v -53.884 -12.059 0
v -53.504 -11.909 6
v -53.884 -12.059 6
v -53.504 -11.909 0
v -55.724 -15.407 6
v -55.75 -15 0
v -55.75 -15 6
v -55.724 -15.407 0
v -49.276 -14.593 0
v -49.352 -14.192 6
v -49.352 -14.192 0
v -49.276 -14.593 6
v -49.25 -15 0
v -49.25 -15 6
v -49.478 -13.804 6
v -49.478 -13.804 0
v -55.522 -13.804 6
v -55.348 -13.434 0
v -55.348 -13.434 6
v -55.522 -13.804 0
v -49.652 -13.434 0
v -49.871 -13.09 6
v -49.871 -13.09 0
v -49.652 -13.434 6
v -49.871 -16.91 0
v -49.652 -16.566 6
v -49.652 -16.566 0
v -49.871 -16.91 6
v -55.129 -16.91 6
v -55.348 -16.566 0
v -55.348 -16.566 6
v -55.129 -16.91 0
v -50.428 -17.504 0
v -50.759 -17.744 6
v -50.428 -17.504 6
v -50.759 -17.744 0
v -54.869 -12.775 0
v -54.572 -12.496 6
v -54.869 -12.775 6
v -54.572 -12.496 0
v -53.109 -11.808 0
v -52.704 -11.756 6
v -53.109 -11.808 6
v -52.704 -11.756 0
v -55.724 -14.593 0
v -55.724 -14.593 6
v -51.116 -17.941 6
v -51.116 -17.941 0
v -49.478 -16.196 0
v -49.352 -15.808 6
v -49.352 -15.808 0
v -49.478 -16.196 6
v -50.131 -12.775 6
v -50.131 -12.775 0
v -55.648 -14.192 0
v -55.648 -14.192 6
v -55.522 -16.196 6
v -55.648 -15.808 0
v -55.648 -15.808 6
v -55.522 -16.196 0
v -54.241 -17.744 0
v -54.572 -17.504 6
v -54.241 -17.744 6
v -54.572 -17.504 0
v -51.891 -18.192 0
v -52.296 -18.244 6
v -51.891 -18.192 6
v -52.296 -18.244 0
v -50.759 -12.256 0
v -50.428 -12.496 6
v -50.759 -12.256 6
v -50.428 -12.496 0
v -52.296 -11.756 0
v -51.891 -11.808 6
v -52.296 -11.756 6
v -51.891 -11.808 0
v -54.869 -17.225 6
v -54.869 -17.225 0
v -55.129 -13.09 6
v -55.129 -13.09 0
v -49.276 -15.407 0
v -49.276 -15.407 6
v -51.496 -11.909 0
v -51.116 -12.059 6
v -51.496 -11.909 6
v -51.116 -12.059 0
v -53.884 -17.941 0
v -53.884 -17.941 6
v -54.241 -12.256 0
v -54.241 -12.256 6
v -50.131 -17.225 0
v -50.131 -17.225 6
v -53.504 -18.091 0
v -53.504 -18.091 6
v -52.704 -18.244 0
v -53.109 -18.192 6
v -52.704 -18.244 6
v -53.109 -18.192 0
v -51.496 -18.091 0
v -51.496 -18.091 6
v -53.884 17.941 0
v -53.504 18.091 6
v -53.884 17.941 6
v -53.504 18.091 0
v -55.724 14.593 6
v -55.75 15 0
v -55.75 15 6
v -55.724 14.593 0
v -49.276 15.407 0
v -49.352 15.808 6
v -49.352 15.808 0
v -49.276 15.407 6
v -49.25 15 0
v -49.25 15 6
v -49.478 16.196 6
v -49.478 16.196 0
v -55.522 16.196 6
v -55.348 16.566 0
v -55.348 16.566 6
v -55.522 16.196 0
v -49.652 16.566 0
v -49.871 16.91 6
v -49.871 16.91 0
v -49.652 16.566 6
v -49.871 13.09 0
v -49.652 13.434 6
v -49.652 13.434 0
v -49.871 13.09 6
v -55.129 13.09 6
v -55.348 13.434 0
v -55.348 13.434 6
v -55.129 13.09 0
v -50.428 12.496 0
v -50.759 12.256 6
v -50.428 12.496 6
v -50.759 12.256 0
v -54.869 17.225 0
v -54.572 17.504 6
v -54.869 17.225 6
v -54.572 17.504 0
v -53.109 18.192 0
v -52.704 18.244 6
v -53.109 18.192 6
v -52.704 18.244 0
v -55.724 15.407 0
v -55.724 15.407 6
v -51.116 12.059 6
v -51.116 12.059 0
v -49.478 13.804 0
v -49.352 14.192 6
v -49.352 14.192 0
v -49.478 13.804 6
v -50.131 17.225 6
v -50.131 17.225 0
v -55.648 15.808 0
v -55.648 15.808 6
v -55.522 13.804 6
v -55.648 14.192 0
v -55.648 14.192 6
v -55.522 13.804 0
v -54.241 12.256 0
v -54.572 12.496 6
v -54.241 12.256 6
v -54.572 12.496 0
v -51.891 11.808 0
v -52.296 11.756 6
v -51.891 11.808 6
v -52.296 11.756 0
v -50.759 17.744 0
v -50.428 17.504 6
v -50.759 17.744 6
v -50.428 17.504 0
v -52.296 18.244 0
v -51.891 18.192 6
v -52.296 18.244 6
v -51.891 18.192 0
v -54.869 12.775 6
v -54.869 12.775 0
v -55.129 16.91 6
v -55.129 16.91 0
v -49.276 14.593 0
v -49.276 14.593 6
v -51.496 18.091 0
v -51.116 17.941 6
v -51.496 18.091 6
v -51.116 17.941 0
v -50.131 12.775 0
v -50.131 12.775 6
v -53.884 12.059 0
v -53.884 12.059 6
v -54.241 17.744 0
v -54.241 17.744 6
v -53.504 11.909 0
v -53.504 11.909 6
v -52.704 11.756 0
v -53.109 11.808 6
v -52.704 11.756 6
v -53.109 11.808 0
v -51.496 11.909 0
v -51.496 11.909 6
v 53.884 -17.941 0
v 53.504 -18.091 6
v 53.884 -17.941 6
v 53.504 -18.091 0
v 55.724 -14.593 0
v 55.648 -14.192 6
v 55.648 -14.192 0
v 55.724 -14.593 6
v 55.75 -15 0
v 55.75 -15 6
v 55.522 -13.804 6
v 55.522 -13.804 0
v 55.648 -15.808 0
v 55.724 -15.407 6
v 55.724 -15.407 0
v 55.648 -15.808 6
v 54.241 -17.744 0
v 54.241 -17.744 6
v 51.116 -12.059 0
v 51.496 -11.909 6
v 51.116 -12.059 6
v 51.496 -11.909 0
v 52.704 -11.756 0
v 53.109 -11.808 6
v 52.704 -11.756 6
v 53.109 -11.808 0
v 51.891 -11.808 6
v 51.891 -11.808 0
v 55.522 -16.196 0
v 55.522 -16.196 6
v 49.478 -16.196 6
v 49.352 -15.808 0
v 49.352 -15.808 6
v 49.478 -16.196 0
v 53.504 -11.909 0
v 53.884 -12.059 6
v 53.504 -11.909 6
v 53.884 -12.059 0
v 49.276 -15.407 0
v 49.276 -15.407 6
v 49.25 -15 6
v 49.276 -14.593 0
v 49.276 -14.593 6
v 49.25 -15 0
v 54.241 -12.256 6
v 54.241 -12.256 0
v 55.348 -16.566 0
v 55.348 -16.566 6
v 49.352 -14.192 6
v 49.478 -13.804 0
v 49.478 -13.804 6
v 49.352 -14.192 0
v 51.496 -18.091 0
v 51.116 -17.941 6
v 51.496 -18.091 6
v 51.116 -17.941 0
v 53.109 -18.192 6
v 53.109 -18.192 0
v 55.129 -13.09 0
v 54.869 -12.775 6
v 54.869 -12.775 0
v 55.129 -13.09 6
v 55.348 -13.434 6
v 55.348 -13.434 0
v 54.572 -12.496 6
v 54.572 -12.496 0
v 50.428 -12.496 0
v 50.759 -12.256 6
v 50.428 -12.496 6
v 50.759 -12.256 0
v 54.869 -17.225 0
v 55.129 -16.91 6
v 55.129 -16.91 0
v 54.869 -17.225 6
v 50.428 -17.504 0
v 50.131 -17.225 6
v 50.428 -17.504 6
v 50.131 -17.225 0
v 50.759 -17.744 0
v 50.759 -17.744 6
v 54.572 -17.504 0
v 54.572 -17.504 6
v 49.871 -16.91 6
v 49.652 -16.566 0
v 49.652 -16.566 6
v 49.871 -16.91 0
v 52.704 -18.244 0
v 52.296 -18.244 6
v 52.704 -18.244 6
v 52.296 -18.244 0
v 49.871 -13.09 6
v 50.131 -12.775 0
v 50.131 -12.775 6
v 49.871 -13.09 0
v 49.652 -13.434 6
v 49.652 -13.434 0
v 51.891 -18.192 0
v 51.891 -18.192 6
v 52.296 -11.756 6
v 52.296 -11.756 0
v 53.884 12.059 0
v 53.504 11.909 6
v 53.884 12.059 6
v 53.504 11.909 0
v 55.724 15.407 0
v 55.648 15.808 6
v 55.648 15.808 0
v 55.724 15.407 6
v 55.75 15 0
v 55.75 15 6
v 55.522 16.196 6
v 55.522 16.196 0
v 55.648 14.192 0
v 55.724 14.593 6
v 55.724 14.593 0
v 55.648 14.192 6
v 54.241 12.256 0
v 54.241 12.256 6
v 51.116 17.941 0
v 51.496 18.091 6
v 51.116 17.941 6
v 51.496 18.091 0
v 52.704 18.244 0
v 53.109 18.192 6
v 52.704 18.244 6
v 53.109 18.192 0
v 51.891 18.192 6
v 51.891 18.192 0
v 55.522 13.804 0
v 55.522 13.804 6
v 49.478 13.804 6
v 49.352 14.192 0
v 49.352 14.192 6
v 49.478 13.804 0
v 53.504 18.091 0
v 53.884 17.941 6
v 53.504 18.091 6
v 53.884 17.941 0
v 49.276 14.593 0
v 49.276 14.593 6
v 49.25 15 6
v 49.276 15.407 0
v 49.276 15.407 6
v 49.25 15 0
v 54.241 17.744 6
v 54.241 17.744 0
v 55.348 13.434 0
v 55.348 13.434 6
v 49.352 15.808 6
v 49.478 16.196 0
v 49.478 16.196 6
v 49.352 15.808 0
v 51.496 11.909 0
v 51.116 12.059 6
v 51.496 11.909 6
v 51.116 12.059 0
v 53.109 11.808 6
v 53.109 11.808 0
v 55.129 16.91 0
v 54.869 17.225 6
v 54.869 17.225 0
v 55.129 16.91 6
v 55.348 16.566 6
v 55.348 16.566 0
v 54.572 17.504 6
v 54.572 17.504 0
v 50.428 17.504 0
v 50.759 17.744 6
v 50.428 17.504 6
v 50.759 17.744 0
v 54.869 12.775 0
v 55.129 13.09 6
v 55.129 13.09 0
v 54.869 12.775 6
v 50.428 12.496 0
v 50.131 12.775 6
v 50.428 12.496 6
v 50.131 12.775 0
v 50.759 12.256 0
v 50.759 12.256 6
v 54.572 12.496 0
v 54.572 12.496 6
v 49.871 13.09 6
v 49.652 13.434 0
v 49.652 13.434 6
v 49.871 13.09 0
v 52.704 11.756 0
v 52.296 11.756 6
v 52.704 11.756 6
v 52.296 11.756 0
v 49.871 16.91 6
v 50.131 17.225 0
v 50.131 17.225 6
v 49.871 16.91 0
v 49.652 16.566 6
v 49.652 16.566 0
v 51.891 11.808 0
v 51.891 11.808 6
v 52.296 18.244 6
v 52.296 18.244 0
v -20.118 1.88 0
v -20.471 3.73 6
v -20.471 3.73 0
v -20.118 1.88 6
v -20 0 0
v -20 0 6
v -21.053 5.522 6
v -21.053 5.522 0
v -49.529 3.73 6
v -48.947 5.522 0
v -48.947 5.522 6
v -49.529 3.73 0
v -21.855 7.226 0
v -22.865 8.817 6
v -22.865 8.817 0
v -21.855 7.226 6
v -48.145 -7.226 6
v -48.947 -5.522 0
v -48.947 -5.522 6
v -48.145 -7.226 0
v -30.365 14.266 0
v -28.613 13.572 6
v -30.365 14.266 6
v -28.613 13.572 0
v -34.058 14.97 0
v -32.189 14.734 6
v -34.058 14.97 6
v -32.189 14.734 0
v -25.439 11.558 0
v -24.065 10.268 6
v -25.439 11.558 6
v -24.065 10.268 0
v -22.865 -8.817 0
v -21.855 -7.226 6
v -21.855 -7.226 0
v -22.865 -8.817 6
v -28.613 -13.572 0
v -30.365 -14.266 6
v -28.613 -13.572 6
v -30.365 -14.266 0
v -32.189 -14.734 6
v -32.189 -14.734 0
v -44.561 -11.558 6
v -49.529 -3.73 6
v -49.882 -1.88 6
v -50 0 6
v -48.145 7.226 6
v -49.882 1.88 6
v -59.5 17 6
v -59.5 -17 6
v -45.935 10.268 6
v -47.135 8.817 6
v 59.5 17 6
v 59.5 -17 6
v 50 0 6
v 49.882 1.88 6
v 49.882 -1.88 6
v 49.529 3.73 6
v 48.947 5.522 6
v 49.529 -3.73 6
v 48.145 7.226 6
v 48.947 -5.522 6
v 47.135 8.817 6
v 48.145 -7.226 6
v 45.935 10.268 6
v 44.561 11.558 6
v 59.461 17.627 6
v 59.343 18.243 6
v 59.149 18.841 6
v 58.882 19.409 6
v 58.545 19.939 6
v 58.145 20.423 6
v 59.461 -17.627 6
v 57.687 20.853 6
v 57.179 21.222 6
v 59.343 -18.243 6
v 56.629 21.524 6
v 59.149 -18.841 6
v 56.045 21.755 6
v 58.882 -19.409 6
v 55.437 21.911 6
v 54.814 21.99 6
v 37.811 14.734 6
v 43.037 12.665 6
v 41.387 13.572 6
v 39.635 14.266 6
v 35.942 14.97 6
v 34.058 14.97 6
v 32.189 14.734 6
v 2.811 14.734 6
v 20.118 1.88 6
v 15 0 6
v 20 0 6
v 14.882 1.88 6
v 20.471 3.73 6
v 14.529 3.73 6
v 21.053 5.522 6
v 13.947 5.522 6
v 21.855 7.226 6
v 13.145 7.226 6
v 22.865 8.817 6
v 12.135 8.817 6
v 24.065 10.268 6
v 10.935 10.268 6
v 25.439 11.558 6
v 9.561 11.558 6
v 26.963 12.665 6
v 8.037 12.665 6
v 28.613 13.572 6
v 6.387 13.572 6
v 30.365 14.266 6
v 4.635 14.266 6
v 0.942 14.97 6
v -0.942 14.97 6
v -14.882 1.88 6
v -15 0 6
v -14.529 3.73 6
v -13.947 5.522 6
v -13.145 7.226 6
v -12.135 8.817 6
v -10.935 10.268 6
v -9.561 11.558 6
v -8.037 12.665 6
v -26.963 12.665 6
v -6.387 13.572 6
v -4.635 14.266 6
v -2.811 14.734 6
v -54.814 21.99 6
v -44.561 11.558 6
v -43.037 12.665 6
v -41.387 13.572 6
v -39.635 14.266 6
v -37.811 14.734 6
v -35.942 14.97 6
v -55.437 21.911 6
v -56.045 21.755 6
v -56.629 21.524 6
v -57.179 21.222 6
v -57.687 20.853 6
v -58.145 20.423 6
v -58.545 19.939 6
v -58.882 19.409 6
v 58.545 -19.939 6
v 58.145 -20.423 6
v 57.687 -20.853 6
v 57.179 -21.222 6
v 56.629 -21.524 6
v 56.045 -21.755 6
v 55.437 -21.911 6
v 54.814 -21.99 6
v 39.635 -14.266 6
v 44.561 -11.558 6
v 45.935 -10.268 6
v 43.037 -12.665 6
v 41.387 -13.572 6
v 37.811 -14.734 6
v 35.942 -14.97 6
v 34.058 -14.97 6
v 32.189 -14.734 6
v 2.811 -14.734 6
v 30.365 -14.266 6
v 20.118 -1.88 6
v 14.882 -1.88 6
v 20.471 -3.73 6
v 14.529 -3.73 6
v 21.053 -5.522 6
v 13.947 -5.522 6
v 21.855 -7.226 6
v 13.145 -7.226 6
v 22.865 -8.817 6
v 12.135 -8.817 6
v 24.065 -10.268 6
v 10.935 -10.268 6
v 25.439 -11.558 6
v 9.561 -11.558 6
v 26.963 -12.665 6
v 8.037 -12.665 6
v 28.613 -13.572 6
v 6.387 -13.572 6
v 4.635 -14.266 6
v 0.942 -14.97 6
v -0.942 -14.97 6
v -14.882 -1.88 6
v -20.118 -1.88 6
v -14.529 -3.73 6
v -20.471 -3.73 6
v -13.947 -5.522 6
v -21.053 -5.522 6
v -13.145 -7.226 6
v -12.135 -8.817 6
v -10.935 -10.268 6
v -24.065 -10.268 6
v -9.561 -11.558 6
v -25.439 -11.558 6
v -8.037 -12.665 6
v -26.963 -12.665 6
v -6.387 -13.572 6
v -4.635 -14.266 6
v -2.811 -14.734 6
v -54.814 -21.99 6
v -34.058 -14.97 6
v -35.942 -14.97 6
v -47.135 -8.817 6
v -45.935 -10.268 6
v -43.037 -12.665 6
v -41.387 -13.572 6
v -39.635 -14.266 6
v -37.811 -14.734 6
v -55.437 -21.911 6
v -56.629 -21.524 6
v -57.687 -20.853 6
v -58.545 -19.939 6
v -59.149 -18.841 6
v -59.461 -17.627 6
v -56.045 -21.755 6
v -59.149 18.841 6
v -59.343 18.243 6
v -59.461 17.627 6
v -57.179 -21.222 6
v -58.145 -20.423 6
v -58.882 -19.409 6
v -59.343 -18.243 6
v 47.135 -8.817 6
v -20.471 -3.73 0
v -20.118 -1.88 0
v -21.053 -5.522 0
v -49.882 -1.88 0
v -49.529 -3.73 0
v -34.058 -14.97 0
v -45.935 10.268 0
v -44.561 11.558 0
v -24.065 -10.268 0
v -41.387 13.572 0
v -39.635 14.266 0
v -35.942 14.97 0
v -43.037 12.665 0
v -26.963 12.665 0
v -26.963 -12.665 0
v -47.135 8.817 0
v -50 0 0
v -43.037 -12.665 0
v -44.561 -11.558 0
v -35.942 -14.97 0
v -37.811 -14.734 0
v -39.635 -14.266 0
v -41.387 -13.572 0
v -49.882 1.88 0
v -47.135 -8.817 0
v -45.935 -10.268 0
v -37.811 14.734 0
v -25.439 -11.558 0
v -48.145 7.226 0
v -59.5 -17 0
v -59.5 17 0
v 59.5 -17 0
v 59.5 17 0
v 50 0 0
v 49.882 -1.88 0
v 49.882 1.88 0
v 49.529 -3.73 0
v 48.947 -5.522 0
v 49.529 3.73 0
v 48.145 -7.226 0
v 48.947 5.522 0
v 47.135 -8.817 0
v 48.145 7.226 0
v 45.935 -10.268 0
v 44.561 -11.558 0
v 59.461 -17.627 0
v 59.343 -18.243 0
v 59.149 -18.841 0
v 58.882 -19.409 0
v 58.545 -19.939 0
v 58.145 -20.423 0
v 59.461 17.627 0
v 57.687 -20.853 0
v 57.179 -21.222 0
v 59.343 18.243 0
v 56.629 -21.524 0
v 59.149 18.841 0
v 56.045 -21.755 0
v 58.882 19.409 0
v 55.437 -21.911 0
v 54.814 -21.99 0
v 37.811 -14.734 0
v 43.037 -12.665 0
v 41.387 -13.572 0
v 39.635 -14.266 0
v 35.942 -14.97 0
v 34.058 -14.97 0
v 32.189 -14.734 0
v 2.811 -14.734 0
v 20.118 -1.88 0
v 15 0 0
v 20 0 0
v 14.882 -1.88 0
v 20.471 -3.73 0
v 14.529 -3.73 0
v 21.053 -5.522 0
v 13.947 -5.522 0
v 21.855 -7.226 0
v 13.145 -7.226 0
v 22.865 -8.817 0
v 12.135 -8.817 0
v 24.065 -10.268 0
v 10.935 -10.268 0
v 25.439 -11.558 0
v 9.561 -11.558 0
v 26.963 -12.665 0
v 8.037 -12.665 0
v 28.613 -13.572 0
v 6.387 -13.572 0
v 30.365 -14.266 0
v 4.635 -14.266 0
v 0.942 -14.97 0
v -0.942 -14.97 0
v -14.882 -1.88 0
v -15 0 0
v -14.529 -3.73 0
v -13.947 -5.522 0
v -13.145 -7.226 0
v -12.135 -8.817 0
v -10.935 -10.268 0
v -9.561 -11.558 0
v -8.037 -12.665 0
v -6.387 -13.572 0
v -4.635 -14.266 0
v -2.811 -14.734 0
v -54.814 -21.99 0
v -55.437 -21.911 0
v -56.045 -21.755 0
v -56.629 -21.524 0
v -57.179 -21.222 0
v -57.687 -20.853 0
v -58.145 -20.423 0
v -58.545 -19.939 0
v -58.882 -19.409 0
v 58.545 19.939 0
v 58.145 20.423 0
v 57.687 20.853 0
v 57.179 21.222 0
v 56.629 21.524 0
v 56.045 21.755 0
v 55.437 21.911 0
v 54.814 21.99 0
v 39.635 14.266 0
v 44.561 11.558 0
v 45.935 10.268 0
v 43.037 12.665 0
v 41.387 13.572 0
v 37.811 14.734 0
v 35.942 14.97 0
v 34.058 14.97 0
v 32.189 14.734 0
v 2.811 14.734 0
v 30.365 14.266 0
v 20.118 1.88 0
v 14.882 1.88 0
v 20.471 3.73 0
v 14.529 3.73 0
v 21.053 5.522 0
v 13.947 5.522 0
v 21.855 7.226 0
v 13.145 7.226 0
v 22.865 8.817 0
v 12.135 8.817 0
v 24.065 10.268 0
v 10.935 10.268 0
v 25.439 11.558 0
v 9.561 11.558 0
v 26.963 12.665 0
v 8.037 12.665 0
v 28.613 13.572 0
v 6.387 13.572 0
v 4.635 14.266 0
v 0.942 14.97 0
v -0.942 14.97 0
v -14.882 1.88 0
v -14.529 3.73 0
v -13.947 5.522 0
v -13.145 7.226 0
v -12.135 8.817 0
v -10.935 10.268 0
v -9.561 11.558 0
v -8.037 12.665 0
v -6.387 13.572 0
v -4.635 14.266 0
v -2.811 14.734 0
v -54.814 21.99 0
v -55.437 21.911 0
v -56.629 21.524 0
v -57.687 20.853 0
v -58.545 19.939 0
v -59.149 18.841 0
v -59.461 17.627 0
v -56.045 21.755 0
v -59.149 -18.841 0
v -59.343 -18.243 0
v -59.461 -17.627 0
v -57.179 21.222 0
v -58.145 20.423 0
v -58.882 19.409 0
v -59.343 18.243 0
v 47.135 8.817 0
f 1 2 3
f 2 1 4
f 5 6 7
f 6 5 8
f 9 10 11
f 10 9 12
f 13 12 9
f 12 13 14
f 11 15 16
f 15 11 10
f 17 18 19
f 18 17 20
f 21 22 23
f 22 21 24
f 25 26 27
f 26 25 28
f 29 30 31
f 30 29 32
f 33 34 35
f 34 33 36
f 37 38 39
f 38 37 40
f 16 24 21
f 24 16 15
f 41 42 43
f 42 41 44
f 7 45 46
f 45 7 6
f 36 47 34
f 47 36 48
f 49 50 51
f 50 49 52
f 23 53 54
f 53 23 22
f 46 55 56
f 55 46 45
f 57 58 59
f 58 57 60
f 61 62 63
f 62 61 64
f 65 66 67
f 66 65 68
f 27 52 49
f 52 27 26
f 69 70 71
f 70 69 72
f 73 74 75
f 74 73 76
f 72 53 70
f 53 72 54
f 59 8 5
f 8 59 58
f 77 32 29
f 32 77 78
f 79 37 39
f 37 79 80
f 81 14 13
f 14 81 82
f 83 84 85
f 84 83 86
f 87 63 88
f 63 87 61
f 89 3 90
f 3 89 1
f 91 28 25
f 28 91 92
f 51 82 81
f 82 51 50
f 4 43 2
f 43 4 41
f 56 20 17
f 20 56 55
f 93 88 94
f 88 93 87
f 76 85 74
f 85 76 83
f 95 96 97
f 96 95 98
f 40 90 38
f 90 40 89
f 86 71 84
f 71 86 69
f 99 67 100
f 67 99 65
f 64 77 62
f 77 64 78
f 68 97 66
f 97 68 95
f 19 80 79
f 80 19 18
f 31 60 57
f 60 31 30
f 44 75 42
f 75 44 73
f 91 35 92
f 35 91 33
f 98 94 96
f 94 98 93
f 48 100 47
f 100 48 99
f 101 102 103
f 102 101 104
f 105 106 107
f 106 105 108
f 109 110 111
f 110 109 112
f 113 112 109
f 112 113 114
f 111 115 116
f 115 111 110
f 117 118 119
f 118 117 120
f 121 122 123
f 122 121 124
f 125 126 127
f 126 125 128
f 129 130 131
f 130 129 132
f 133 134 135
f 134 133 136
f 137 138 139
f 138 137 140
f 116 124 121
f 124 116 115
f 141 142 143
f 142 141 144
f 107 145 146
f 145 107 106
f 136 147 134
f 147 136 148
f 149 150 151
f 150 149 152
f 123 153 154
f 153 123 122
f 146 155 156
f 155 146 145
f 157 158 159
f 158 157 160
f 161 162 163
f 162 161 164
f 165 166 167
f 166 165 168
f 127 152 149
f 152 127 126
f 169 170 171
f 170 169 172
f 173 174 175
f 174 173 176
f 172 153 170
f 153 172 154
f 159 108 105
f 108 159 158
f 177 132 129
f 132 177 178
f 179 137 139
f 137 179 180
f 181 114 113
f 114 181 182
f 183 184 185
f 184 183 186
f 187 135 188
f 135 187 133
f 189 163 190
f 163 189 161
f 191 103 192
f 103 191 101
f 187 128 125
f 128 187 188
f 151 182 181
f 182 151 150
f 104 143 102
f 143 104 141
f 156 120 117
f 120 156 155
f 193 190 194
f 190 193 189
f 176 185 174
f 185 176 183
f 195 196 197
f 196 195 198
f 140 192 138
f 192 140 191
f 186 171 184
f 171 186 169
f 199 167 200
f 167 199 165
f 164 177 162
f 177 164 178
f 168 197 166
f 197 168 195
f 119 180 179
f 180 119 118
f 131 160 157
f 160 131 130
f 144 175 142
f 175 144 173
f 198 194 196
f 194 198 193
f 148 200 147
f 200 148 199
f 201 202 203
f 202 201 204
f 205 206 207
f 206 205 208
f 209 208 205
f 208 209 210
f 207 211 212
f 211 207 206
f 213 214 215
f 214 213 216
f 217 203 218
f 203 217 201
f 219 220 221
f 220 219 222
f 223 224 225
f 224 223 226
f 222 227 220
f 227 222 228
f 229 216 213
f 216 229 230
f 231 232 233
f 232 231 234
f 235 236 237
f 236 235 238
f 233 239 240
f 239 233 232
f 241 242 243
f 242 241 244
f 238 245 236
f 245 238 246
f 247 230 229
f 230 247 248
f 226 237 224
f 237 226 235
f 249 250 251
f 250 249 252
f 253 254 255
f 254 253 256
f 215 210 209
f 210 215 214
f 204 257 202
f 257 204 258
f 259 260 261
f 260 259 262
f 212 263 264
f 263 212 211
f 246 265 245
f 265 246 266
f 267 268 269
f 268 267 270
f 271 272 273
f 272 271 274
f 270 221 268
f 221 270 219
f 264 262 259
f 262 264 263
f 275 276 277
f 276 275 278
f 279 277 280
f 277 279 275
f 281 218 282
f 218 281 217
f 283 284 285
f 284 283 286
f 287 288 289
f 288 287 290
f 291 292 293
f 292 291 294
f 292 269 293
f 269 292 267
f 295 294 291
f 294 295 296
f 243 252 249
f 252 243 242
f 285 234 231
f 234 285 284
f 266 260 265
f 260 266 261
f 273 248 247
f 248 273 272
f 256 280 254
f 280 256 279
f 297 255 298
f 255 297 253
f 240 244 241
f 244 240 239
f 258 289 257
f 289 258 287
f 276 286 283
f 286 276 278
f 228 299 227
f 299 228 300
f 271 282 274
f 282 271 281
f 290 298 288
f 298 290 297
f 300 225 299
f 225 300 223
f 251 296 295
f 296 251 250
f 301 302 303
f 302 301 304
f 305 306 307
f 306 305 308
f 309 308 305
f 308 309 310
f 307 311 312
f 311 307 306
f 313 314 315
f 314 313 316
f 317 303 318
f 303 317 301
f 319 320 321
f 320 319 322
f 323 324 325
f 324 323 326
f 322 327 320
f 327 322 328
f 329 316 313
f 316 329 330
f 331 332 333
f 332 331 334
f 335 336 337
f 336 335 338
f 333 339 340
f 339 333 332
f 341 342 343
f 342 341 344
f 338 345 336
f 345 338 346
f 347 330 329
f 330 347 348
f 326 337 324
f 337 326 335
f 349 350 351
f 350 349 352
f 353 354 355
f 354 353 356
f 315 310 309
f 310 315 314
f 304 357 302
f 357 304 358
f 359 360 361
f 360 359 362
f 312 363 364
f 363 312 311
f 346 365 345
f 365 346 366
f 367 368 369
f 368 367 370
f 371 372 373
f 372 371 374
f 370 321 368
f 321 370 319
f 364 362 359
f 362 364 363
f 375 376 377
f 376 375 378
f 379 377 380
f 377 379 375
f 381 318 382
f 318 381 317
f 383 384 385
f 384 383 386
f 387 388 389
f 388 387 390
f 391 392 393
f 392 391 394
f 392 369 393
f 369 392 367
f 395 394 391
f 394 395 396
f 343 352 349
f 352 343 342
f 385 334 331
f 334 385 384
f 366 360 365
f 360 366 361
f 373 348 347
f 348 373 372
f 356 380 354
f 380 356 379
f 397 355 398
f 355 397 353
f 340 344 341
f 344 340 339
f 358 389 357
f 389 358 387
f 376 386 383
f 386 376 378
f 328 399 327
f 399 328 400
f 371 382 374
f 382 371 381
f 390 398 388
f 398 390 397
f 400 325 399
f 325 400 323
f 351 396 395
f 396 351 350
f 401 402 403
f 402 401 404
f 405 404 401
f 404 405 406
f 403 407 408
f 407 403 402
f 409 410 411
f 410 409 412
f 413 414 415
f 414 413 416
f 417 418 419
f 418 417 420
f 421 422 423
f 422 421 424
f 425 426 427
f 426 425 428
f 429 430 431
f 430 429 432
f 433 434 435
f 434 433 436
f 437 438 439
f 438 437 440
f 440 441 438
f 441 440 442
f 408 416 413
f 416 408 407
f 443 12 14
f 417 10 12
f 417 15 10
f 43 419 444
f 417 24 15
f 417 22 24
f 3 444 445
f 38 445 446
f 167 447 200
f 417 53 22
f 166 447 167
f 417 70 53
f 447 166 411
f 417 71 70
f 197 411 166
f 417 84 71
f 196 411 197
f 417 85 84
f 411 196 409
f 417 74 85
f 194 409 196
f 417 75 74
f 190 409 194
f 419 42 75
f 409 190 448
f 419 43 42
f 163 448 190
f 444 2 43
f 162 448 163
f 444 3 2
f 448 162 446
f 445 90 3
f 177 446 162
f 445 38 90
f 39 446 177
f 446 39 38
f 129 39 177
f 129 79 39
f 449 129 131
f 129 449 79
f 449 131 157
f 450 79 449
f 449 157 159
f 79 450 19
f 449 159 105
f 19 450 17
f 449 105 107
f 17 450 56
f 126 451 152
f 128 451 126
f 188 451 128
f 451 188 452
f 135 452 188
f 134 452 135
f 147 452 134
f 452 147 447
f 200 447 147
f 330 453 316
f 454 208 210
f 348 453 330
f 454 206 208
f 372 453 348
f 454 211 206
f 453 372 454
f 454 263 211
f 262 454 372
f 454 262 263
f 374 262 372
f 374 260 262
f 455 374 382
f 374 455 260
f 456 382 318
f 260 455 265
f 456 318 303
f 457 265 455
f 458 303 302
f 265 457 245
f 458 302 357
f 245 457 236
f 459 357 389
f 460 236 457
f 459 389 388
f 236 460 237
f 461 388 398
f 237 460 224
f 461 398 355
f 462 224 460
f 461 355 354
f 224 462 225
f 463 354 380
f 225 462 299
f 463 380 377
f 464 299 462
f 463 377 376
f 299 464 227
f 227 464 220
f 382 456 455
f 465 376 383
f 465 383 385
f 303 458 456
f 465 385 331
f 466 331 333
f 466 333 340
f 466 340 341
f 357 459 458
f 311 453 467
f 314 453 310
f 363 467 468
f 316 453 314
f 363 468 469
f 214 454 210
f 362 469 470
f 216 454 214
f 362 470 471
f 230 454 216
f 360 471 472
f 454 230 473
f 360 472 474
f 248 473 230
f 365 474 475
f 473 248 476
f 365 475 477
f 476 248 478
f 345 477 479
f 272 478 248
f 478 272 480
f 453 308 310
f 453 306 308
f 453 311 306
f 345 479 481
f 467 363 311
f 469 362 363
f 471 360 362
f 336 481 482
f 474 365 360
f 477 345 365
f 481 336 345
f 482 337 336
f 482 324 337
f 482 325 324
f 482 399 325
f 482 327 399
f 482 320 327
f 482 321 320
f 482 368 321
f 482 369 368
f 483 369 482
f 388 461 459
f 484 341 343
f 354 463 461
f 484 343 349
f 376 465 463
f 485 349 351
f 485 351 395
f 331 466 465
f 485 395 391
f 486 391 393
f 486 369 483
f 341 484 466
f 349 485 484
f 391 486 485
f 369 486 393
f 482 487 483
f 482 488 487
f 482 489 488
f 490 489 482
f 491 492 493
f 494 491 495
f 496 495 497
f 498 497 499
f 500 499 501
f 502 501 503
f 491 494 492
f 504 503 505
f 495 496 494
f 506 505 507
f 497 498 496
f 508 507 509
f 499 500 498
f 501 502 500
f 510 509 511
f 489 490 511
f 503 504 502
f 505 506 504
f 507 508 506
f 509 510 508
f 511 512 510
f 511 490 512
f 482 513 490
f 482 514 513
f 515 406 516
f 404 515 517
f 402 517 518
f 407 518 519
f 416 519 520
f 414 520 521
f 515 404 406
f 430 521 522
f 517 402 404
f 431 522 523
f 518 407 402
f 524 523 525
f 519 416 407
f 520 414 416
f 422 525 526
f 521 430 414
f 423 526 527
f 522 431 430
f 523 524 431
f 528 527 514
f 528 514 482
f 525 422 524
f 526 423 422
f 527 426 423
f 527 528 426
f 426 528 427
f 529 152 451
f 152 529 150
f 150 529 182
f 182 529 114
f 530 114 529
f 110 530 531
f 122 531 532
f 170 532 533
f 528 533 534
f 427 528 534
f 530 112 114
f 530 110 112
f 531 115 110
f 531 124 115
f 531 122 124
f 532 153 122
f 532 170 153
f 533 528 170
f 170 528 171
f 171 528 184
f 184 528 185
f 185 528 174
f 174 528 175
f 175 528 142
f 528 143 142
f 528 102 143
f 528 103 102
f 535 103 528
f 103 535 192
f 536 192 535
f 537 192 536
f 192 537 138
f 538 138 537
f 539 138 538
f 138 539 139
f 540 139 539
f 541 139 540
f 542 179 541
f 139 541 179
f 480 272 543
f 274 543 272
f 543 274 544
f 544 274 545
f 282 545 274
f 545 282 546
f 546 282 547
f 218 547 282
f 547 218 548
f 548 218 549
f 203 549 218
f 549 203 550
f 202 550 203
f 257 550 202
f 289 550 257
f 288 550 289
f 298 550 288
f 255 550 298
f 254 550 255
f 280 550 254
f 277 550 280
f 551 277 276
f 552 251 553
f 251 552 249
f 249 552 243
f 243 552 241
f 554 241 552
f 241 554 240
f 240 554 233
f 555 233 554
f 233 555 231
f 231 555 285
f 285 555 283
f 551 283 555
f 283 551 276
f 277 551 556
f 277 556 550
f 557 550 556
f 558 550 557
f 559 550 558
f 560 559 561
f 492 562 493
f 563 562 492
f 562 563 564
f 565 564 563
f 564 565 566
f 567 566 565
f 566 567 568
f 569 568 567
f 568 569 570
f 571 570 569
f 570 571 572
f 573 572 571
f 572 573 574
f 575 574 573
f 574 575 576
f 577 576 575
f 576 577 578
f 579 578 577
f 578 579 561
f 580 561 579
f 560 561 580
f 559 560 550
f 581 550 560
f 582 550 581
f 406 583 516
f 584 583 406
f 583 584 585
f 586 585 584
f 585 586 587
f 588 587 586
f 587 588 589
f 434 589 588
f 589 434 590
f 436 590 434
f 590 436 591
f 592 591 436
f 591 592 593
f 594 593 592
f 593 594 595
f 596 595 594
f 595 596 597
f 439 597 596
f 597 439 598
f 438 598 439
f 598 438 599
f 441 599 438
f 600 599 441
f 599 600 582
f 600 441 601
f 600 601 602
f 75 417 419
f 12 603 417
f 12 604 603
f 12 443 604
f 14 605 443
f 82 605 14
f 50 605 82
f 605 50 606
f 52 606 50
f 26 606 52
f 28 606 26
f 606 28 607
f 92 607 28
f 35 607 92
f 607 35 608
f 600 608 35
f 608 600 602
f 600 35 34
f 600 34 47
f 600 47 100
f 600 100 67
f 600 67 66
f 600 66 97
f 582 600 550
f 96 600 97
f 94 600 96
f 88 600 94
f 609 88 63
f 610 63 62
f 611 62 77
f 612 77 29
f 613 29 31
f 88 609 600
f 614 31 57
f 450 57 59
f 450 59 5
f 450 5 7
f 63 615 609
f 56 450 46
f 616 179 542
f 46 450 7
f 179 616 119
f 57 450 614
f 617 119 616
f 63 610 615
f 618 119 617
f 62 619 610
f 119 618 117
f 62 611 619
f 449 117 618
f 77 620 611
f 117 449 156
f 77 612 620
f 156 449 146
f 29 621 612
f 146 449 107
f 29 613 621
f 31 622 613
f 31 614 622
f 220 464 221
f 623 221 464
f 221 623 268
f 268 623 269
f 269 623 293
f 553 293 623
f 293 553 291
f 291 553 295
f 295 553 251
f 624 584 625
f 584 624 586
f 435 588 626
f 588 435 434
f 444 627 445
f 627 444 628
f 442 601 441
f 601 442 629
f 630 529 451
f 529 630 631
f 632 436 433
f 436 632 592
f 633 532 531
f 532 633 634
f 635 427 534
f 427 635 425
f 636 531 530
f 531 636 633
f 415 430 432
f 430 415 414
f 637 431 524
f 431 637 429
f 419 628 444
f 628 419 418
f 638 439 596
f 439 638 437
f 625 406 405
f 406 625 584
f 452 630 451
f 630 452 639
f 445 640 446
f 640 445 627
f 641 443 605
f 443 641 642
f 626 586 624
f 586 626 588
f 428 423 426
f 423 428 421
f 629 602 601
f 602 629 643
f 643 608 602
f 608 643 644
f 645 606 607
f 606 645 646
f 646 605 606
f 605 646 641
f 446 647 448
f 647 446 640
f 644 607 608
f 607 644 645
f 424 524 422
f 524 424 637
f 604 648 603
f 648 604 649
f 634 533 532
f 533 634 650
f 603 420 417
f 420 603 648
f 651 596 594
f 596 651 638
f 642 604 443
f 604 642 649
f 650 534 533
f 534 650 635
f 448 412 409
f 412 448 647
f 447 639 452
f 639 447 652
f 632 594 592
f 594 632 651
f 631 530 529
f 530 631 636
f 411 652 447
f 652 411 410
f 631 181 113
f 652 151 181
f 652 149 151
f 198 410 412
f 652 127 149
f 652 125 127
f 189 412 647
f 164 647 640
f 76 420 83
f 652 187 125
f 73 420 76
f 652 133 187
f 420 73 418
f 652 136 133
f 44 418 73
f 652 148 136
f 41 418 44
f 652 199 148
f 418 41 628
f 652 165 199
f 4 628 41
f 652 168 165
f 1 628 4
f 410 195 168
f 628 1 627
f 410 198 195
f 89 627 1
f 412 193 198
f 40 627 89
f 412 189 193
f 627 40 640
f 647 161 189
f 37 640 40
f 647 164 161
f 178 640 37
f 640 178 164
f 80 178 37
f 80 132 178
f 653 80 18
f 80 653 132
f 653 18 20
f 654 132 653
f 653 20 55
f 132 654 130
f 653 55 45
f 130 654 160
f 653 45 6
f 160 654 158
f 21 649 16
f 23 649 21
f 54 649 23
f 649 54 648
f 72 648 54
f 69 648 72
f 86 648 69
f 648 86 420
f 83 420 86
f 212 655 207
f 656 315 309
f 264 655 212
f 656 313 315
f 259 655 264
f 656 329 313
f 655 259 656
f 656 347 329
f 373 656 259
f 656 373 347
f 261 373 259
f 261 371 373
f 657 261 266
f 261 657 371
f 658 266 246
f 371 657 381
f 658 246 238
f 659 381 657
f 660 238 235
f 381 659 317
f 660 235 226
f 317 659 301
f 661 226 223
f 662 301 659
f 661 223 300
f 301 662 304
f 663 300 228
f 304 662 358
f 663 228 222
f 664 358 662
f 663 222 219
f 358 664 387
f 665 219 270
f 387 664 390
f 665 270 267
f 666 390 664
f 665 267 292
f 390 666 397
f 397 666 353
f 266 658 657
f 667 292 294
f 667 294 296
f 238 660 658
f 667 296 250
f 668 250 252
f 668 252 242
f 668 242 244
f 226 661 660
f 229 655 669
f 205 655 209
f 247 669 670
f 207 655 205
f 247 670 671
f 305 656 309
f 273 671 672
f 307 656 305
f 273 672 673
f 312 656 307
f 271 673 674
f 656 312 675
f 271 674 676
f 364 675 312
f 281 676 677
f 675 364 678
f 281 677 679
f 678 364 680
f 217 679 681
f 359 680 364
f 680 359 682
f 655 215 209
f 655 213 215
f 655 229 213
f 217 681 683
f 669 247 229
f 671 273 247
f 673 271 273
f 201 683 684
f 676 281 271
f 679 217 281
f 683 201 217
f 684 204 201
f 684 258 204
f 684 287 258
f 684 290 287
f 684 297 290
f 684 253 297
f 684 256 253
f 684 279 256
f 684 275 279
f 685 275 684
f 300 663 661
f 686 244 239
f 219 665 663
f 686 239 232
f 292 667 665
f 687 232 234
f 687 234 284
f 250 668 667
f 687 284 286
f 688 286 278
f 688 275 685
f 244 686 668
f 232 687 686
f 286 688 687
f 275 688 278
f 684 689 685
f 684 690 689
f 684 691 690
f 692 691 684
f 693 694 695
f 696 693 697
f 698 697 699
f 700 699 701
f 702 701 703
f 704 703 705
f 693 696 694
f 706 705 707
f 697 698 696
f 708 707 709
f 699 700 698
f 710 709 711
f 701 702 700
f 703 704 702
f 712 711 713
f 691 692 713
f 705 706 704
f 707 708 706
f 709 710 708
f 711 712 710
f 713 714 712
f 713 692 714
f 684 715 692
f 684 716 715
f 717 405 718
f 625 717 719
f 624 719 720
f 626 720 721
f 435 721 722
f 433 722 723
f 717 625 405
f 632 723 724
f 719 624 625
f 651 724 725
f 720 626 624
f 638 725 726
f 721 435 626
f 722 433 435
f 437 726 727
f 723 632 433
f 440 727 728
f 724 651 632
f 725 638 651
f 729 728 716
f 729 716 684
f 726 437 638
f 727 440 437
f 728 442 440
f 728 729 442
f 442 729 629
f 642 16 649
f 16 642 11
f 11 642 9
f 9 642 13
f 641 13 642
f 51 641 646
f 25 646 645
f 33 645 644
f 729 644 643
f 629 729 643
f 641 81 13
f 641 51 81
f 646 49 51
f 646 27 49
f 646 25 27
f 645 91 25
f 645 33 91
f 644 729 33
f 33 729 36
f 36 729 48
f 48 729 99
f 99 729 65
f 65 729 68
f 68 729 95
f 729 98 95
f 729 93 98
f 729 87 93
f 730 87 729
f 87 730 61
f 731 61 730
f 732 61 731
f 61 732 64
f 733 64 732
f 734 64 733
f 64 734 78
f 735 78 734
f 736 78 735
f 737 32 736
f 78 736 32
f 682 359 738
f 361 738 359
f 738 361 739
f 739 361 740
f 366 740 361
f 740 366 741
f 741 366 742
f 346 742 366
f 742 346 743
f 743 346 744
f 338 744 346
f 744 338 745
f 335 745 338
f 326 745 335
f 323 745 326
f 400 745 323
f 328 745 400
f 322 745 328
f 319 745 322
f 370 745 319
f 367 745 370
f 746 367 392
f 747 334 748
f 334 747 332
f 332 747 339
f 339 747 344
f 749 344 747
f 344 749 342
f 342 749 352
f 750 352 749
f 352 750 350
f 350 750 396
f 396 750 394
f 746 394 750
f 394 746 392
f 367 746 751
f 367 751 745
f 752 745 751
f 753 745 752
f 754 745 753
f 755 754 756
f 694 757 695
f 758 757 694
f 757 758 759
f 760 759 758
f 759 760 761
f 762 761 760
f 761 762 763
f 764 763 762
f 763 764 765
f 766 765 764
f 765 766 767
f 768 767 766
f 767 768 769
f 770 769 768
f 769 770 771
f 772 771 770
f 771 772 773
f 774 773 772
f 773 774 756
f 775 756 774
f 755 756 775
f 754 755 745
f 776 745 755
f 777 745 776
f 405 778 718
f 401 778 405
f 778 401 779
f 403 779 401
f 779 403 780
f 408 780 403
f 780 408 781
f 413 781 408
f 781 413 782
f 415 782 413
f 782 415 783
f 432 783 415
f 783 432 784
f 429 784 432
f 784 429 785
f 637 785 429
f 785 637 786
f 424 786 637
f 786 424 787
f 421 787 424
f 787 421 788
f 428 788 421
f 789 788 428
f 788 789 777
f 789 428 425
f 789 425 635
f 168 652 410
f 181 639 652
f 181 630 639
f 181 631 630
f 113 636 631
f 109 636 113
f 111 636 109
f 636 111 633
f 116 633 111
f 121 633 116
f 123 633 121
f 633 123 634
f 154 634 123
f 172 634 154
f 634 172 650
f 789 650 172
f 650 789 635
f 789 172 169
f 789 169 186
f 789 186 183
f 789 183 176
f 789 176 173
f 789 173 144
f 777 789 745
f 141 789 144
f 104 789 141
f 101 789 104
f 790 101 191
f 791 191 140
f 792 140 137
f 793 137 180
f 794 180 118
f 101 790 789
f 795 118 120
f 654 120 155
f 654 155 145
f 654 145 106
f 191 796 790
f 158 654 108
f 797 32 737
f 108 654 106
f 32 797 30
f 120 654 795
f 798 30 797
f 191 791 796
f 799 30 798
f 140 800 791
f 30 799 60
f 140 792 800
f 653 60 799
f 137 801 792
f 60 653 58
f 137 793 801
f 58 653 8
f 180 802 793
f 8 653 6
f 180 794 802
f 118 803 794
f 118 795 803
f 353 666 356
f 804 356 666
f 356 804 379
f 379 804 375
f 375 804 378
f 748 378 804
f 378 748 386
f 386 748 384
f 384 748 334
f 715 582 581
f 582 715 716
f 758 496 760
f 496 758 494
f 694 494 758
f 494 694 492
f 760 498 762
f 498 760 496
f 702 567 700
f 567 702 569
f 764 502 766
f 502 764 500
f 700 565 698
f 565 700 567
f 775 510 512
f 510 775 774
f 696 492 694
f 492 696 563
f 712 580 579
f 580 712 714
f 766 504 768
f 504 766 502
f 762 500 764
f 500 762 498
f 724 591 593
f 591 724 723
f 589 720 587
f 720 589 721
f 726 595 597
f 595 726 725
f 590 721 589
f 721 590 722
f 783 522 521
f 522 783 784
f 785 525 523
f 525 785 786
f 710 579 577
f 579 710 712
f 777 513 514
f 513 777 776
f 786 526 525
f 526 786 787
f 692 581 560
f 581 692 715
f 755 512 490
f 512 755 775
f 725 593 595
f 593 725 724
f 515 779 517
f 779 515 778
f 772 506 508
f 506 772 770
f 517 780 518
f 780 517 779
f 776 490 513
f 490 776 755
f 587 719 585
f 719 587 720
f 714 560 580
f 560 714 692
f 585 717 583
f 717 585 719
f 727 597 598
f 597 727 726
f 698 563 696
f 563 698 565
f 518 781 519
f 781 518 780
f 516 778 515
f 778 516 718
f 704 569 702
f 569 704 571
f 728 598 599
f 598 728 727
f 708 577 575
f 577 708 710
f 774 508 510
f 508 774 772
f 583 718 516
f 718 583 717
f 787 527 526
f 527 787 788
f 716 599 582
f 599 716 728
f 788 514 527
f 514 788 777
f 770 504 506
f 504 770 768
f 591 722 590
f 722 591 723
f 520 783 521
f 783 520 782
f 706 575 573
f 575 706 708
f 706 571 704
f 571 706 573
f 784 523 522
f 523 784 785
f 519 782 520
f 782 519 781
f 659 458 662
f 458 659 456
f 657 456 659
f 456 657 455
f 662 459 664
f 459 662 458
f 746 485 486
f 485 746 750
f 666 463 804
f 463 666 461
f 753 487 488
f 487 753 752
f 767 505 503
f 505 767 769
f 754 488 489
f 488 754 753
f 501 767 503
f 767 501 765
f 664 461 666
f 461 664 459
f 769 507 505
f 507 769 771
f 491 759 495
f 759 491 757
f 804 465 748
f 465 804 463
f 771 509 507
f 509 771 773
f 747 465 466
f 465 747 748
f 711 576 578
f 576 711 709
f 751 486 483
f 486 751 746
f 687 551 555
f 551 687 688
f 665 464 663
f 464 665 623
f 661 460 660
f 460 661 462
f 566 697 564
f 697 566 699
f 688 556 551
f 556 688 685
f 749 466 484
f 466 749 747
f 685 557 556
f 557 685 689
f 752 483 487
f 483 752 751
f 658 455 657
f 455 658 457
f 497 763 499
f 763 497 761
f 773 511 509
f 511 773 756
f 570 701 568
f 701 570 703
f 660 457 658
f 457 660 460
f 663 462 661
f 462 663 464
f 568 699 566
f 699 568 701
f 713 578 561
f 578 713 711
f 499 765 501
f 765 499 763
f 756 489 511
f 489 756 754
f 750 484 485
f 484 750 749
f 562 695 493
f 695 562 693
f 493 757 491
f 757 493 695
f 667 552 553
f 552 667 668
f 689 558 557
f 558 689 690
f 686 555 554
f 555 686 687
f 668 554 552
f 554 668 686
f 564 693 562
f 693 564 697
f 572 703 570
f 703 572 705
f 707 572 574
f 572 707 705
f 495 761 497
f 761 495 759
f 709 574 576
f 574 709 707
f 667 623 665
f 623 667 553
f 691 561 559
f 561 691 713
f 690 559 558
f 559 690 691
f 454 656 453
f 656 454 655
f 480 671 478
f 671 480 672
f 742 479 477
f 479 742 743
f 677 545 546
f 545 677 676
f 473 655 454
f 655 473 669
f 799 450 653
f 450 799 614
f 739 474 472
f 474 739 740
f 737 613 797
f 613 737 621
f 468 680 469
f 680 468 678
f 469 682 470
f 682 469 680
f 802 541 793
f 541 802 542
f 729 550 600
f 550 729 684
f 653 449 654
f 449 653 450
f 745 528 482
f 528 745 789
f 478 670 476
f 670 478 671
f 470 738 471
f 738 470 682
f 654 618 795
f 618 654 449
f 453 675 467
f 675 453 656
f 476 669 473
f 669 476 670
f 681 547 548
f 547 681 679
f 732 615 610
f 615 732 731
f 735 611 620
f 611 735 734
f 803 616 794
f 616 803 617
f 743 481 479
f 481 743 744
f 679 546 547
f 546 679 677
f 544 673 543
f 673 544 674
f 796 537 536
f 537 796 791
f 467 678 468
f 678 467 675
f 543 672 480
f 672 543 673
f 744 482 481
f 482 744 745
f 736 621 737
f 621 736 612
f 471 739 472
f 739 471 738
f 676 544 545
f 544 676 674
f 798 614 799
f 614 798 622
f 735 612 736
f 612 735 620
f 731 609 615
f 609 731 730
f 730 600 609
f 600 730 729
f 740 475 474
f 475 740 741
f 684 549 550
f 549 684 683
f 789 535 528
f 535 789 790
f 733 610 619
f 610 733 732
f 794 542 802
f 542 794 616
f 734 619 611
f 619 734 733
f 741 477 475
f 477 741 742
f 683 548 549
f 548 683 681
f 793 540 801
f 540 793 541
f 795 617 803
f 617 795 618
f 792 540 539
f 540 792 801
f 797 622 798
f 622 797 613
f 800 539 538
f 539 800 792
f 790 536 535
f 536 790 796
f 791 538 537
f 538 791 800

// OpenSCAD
$fn = 50;


difference() {
	union() {
		hull() {
			translate(v = [-54.5000000000, 17.0000000000, 0]) {
				cylinder(h = 6, r = 5);
			}
			translate(v = [54.5000000000, 17.0000000000, 0]) {
				cylinder(h = 6, r = 5);
			}
			translate(v = [-54.5000000000, -17.0000000000, 0]) {
				cylinder(h = 6, r = 5);
			}
			translate(v = [54.5000000000, -17.0000000000, 0]) {
				cylinder(h = 6, r = 5);
			}
		}
	}
	union() {
		#translate(v = [-52.5000000000, -15.0000000000, -100.0000000000]) {
			cylinder(h = 200, r = 3.2500000000);
		}
		#translate(v = [-52.5000000000, 15.0000000000, -100.0000000000]) {
			cylinder(h = 200, r = 3.2500000000);
		}
		#translate(v = [52.5000000000, -15.0000000000, -100.0000000000]) {
			cylinder(h = 200, r = 3.2500000000);
		}
		#translate(v = [52.5000000000, 15.0000000000, -100.0000000000]) {
			cylinder(h = 200, r = 3.2500000000);
		}
		#translate(v = [-35.0000000000, 0, 0]) {
			cylinder(h = 6, r = 15.0000000000);
		}
		#cylinder(h = 6, r = 15.0000000000);
		#translate(v = [35.0000000000, 0, 0]) {
			cylinder(h = 6, r = 15.0000000000);
		}
	}
}
